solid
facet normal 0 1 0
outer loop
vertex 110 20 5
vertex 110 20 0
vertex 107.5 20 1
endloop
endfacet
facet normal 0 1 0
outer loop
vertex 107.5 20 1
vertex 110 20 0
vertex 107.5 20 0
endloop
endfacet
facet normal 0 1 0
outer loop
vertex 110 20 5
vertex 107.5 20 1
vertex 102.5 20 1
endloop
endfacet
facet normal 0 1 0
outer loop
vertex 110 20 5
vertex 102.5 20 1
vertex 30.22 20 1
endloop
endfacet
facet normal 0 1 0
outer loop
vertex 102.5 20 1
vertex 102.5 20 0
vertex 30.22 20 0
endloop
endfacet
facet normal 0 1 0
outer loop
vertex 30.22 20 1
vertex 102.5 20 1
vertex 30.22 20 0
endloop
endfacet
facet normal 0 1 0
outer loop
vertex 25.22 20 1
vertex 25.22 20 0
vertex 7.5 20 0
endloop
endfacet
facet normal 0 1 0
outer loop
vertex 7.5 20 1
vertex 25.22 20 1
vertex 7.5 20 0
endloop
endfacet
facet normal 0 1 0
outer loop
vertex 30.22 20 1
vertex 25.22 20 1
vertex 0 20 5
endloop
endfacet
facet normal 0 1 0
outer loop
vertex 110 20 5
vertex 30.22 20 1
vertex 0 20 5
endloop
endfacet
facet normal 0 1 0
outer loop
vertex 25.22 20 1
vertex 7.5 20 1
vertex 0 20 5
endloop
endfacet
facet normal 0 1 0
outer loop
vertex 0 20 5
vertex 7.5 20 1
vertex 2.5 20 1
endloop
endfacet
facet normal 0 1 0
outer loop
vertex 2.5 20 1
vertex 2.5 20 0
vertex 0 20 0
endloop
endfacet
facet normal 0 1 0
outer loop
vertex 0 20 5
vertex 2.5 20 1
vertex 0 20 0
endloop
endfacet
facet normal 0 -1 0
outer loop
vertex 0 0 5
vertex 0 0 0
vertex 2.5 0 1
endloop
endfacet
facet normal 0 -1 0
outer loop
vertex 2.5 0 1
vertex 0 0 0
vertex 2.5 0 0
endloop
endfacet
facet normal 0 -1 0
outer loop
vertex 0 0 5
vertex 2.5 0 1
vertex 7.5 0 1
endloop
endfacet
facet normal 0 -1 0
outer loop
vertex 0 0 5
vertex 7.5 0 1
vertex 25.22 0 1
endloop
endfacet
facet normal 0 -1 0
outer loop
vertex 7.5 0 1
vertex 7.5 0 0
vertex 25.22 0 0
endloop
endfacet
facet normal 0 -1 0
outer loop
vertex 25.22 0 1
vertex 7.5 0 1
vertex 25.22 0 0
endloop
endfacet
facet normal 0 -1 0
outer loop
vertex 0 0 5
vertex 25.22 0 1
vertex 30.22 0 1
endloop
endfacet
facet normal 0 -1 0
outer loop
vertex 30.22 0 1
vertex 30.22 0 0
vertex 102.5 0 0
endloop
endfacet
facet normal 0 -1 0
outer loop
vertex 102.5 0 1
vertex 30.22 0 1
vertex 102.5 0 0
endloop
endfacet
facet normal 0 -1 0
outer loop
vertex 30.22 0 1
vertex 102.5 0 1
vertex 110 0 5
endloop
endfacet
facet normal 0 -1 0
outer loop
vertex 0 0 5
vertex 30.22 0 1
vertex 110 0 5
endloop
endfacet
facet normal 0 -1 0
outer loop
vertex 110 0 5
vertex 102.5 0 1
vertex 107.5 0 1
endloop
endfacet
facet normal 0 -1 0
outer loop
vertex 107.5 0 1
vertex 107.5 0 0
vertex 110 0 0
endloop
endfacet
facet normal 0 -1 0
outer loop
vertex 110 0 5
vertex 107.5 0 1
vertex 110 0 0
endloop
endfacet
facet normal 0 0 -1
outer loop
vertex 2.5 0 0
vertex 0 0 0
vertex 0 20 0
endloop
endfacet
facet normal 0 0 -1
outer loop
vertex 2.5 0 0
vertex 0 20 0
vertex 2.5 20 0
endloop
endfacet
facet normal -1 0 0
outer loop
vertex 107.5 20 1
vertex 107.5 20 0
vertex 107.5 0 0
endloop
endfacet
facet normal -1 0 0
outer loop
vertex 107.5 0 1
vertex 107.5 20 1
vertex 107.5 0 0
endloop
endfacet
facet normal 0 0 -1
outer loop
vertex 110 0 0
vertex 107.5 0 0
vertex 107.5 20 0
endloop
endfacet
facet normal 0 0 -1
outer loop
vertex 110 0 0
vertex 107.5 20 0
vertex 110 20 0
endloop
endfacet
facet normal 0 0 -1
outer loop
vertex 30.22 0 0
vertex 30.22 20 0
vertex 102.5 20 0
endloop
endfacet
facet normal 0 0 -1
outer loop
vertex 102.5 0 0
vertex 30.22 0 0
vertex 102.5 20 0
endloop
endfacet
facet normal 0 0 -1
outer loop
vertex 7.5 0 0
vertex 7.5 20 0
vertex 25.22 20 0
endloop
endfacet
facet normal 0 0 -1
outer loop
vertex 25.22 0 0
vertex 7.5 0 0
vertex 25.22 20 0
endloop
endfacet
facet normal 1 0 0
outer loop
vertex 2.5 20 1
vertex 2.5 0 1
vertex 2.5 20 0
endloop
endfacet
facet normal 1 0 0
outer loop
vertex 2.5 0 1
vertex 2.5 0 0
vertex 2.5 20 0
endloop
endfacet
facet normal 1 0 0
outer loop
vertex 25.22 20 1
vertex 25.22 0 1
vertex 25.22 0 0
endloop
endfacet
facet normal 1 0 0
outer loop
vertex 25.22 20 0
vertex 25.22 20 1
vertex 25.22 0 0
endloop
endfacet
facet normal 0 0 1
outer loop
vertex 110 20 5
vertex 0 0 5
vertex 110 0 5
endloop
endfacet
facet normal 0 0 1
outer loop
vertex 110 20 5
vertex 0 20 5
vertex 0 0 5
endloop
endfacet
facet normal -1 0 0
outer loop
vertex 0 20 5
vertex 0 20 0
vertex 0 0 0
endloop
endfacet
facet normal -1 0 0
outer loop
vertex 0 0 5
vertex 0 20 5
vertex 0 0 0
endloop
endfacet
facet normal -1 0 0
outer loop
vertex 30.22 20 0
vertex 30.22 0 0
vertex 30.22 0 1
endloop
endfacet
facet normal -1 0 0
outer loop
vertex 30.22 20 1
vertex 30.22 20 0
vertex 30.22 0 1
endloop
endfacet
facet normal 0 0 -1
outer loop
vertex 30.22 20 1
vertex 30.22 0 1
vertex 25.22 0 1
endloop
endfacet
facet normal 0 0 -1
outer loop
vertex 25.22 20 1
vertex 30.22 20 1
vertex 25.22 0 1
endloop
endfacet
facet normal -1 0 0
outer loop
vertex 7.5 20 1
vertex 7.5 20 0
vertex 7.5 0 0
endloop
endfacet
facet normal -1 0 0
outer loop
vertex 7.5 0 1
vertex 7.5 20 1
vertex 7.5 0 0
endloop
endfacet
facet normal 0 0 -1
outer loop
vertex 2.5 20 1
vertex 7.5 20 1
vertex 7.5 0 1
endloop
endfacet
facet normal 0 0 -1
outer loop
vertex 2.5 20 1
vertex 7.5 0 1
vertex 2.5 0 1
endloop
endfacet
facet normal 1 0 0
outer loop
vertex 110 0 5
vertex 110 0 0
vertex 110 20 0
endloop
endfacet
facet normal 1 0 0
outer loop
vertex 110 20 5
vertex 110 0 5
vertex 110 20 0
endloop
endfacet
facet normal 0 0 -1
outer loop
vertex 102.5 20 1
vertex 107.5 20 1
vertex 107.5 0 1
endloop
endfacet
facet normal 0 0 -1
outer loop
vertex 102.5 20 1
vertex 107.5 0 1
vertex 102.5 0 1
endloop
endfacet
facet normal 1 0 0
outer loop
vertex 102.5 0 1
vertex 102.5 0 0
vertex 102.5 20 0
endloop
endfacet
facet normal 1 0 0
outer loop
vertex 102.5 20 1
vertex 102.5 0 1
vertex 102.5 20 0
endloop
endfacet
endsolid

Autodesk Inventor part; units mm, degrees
ref_plane "YZ Plane" through (0, 0, 0) normal (1, 0, 0) x (0, 1, 0)
ref_plane "XZ Plane" through (0, 0, 0) normal (0, 1, 0) x (-1, 0, 0)
ref_plane "XY Plane" through (0, 0, 0) normal (0, 0, 1) x (1, 0, 0)
sketch "スケッチ1" plane through (0, 0, 0) normal (0, 0, 1) x (1, 0, 0)
  line L0 (0, 0) -> (110, 0)
  line L1 (110, 0) -> (110, 20)
  line L2 (110, 20) -> (0, 20)
  line L3 (0, 20) -> (0, 0)
  dimension "d0" = 110
  dimension "d1" = 20
extrude "押し出し1" add sketch "スケッチ1" along normal blind 5
sketch "スケッチ2" plane through (0, 0, 0) normal (0, 0, -1) x (-1, 0, 0)
  line L0 (-110, 0) -> (-110, 20) projected
  line L1 (0, 0) -> (-110, 0) projected
  line L2 (0, 20) -> (0, 0) projected
  line L3 (-110, 20) -> (0, 20) projected
  line L4 (-2.5, 20) -> (-7.5, 20)
  line L5 (-7.5, 20) -> (-7.5, 0)
  line L6 (-7.5, 0) -> (-2.5, 0)
  line L7 (-2.5, 0) -> (-2.5, 20)
  line L8 (-107.5, 0) -> (-102.5, 0)
  line L9 (-102.5, 0) -> (-102.5, 20)
  line L10 (-102.5, 20) -> (-107.5, 20)
  line L11 (-107.5, 20) -> (-107.5, 0)
  point P0 (-107.5, 20)
  point P1 (-102.5, 0)
  dimension "d4" = 5
  dimension "d5" = 2.5
  dimension "d6" = 5
  dimension "d7" = 2.5
extrude "押し出し2" cut sketch "スケッチ2" against normal blind 1 contours L11 L3 L9 L1 | L5 L3 L7 L1
sketch "スケッチ3" plane through (0, 0, 5) normal (0, -1, 0) x (1, 0, 0)
  line L0 (30.22, -4) -> (25.22, -4) projected
  line L1 (25.22, -4) -> (25.22, -356) projected
  line L2 (25.22, -356) -> (30.22, -356) projected
  line L3 (30.22, -356) -> (30.22, -4) projected
extrude "押し出し3" cut sketch "スケッチ3" against normal through all
properties part number "arm1_S"
